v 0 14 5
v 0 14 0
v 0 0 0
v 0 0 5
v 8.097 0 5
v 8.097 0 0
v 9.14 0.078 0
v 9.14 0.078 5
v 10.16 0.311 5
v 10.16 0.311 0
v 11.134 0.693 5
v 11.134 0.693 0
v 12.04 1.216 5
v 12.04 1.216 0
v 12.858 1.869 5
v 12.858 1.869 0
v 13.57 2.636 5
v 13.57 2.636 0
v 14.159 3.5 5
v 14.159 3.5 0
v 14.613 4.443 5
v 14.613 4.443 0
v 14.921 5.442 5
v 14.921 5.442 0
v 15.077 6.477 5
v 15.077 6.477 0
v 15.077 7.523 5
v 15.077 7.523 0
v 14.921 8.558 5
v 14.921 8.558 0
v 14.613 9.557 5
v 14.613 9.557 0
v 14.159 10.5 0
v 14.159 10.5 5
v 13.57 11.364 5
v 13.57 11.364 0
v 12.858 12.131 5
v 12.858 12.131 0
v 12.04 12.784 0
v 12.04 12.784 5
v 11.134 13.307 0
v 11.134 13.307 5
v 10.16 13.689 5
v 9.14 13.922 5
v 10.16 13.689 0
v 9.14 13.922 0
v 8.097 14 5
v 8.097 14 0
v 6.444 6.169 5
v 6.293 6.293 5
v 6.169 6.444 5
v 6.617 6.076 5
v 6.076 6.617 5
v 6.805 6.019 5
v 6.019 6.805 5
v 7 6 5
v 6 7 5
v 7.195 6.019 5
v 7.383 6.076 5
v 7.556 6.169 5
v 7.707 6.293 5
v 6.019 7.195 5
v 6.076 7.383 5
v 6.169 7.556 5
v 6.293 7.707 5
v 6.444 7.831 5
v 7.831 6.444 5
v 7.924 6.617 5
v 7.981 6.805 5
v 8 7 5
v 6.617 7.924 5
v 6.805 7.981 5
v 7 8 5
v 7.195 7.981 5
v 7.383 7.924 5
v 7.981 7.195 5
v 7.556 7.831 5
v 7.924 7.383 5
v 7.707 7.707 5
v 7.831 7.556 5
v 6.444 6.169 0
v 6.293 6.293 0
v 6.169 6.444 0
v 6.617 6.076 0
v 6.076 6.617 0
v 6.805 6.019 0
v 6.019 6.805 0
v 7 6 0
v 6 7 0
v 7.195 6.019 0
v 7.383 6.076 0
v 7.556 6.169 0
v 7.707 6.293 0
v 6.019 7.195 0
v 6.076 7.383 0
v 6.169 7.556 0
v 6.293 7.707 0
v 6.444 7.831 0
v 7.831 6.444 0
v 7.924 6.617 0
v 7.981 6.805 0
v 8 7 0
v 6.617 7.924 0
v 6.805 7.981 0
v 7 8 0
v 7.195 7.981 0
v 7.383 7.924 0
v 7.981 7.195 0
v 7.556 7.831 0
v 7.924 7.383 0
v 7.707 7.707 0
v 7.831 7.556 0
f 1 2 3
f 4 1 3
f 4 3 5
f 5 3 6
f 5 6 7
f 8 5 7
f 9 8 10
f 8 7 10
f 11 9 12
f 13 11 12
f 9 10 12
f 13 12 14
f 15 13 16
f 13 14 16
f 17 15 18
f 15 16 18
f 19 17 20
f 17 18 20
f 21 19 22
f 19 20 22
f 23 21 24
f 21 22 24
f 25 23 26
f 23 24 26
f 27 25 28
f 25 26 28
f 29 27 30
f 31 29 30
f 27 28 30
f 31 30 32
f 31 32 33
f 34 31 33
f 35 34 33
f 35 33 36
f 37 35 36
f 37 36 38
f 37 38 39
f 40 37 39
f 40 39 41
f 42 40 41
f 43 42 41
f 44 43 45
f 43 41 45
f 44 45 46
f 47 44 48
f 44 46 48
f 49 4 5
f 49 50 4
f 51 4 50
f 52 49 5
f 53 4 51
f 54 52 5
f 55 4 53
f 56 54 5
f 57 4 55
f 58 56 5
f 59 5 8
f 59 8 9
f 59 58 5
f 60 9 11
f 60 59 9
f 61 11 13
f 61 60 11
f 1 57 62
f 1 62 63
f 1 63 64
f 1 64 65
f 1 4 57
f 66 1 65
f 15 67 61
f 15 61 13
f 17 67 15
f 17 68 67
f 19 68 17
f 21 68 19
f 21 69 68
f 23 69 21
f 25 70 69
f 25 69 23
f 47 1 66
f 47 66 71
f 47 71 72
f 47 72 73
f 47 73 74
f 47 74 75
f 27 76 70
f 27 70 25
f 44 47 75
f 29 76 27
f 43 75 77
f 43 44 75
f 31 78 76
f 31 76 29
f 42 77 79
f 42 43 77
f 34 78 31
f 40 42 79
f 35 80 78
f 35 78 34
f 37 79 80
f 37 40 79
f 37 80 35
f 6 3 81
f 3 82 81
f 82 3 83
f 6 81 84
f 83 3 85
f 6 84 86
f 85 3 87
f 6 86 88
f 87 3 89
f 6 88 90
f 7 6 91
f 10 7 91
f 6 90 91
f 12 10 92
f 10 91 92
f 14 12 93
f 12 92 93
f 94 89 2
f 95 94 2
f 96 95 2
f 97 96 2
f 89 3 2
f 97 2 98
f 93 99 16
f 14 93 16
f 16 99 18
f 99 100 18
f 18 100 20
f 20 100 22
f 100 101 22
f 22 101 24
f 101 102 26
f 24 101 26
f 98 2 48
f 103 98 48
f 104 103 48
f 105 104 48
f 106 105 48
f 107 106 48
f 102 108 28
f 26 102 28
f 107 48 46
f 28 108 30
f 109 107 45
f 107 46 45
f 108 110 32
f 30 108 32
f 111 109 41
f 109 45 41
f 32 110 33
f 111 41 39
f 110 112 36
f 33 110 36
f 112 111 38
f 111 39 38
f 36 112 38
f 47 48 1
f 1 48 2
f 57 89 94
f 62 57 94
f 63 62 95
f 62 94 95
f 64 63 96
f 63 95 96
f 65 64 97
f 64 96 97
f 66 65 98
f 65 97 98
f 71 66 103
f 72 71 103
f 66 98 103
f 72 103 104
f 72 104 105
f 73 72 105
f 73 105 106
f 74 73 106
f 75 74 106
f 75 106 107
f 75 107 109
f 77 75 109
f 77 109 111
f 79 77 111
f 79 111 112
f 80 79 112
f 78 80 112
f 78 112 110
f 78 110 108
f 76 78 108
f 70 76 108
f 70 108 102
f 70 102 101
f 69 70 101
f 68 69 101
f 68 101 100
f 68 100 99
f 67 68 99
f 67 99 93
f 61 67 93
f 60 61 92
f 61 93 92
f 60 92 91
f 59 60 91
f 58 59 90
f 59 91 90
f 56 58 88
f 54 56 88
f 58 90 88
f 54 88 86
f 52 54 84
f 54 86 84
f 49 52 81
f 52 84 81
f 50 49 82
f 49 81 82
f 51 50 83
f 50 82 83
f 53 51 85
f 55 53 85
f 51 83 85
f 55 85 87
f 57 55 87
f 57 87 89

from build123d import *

# Parameters (mm, degrees)
BOSS_EXTRU_1_DEPTH            = 5
TROU_DE_PASSAGE_D_AXE_3_322_D = 2


with BuildPart() as part:
    # Esquisse1 → Boss.-Extru.1 (new body)
    with BuildSketch(Plane.XY):
        with BuildLine():
            Line((0, 14), (0, 0))
            Line((0, 0), (8.096774194, 0))
            ThreePointArc((8.096774194, 0), (15.096774194, 7), (8.096774194, 14))
            Line((8.096774194, 14), (0, 14))
        make_face()
    extrude(amount=BOSS_EXTRU_1_DEPTH)

    # Trou de passage d'axe 3/322 (through all)
    with Locations(Plane(origin=(7, 7, 5), x_dir=(1, 0, 0), z_dir=(0, 0, 1))):
        with Locations((0, 0)):
            Hole(TROU_DE_PASSAGE_D_AXE_3_322_D / 2)


solid = part.part
